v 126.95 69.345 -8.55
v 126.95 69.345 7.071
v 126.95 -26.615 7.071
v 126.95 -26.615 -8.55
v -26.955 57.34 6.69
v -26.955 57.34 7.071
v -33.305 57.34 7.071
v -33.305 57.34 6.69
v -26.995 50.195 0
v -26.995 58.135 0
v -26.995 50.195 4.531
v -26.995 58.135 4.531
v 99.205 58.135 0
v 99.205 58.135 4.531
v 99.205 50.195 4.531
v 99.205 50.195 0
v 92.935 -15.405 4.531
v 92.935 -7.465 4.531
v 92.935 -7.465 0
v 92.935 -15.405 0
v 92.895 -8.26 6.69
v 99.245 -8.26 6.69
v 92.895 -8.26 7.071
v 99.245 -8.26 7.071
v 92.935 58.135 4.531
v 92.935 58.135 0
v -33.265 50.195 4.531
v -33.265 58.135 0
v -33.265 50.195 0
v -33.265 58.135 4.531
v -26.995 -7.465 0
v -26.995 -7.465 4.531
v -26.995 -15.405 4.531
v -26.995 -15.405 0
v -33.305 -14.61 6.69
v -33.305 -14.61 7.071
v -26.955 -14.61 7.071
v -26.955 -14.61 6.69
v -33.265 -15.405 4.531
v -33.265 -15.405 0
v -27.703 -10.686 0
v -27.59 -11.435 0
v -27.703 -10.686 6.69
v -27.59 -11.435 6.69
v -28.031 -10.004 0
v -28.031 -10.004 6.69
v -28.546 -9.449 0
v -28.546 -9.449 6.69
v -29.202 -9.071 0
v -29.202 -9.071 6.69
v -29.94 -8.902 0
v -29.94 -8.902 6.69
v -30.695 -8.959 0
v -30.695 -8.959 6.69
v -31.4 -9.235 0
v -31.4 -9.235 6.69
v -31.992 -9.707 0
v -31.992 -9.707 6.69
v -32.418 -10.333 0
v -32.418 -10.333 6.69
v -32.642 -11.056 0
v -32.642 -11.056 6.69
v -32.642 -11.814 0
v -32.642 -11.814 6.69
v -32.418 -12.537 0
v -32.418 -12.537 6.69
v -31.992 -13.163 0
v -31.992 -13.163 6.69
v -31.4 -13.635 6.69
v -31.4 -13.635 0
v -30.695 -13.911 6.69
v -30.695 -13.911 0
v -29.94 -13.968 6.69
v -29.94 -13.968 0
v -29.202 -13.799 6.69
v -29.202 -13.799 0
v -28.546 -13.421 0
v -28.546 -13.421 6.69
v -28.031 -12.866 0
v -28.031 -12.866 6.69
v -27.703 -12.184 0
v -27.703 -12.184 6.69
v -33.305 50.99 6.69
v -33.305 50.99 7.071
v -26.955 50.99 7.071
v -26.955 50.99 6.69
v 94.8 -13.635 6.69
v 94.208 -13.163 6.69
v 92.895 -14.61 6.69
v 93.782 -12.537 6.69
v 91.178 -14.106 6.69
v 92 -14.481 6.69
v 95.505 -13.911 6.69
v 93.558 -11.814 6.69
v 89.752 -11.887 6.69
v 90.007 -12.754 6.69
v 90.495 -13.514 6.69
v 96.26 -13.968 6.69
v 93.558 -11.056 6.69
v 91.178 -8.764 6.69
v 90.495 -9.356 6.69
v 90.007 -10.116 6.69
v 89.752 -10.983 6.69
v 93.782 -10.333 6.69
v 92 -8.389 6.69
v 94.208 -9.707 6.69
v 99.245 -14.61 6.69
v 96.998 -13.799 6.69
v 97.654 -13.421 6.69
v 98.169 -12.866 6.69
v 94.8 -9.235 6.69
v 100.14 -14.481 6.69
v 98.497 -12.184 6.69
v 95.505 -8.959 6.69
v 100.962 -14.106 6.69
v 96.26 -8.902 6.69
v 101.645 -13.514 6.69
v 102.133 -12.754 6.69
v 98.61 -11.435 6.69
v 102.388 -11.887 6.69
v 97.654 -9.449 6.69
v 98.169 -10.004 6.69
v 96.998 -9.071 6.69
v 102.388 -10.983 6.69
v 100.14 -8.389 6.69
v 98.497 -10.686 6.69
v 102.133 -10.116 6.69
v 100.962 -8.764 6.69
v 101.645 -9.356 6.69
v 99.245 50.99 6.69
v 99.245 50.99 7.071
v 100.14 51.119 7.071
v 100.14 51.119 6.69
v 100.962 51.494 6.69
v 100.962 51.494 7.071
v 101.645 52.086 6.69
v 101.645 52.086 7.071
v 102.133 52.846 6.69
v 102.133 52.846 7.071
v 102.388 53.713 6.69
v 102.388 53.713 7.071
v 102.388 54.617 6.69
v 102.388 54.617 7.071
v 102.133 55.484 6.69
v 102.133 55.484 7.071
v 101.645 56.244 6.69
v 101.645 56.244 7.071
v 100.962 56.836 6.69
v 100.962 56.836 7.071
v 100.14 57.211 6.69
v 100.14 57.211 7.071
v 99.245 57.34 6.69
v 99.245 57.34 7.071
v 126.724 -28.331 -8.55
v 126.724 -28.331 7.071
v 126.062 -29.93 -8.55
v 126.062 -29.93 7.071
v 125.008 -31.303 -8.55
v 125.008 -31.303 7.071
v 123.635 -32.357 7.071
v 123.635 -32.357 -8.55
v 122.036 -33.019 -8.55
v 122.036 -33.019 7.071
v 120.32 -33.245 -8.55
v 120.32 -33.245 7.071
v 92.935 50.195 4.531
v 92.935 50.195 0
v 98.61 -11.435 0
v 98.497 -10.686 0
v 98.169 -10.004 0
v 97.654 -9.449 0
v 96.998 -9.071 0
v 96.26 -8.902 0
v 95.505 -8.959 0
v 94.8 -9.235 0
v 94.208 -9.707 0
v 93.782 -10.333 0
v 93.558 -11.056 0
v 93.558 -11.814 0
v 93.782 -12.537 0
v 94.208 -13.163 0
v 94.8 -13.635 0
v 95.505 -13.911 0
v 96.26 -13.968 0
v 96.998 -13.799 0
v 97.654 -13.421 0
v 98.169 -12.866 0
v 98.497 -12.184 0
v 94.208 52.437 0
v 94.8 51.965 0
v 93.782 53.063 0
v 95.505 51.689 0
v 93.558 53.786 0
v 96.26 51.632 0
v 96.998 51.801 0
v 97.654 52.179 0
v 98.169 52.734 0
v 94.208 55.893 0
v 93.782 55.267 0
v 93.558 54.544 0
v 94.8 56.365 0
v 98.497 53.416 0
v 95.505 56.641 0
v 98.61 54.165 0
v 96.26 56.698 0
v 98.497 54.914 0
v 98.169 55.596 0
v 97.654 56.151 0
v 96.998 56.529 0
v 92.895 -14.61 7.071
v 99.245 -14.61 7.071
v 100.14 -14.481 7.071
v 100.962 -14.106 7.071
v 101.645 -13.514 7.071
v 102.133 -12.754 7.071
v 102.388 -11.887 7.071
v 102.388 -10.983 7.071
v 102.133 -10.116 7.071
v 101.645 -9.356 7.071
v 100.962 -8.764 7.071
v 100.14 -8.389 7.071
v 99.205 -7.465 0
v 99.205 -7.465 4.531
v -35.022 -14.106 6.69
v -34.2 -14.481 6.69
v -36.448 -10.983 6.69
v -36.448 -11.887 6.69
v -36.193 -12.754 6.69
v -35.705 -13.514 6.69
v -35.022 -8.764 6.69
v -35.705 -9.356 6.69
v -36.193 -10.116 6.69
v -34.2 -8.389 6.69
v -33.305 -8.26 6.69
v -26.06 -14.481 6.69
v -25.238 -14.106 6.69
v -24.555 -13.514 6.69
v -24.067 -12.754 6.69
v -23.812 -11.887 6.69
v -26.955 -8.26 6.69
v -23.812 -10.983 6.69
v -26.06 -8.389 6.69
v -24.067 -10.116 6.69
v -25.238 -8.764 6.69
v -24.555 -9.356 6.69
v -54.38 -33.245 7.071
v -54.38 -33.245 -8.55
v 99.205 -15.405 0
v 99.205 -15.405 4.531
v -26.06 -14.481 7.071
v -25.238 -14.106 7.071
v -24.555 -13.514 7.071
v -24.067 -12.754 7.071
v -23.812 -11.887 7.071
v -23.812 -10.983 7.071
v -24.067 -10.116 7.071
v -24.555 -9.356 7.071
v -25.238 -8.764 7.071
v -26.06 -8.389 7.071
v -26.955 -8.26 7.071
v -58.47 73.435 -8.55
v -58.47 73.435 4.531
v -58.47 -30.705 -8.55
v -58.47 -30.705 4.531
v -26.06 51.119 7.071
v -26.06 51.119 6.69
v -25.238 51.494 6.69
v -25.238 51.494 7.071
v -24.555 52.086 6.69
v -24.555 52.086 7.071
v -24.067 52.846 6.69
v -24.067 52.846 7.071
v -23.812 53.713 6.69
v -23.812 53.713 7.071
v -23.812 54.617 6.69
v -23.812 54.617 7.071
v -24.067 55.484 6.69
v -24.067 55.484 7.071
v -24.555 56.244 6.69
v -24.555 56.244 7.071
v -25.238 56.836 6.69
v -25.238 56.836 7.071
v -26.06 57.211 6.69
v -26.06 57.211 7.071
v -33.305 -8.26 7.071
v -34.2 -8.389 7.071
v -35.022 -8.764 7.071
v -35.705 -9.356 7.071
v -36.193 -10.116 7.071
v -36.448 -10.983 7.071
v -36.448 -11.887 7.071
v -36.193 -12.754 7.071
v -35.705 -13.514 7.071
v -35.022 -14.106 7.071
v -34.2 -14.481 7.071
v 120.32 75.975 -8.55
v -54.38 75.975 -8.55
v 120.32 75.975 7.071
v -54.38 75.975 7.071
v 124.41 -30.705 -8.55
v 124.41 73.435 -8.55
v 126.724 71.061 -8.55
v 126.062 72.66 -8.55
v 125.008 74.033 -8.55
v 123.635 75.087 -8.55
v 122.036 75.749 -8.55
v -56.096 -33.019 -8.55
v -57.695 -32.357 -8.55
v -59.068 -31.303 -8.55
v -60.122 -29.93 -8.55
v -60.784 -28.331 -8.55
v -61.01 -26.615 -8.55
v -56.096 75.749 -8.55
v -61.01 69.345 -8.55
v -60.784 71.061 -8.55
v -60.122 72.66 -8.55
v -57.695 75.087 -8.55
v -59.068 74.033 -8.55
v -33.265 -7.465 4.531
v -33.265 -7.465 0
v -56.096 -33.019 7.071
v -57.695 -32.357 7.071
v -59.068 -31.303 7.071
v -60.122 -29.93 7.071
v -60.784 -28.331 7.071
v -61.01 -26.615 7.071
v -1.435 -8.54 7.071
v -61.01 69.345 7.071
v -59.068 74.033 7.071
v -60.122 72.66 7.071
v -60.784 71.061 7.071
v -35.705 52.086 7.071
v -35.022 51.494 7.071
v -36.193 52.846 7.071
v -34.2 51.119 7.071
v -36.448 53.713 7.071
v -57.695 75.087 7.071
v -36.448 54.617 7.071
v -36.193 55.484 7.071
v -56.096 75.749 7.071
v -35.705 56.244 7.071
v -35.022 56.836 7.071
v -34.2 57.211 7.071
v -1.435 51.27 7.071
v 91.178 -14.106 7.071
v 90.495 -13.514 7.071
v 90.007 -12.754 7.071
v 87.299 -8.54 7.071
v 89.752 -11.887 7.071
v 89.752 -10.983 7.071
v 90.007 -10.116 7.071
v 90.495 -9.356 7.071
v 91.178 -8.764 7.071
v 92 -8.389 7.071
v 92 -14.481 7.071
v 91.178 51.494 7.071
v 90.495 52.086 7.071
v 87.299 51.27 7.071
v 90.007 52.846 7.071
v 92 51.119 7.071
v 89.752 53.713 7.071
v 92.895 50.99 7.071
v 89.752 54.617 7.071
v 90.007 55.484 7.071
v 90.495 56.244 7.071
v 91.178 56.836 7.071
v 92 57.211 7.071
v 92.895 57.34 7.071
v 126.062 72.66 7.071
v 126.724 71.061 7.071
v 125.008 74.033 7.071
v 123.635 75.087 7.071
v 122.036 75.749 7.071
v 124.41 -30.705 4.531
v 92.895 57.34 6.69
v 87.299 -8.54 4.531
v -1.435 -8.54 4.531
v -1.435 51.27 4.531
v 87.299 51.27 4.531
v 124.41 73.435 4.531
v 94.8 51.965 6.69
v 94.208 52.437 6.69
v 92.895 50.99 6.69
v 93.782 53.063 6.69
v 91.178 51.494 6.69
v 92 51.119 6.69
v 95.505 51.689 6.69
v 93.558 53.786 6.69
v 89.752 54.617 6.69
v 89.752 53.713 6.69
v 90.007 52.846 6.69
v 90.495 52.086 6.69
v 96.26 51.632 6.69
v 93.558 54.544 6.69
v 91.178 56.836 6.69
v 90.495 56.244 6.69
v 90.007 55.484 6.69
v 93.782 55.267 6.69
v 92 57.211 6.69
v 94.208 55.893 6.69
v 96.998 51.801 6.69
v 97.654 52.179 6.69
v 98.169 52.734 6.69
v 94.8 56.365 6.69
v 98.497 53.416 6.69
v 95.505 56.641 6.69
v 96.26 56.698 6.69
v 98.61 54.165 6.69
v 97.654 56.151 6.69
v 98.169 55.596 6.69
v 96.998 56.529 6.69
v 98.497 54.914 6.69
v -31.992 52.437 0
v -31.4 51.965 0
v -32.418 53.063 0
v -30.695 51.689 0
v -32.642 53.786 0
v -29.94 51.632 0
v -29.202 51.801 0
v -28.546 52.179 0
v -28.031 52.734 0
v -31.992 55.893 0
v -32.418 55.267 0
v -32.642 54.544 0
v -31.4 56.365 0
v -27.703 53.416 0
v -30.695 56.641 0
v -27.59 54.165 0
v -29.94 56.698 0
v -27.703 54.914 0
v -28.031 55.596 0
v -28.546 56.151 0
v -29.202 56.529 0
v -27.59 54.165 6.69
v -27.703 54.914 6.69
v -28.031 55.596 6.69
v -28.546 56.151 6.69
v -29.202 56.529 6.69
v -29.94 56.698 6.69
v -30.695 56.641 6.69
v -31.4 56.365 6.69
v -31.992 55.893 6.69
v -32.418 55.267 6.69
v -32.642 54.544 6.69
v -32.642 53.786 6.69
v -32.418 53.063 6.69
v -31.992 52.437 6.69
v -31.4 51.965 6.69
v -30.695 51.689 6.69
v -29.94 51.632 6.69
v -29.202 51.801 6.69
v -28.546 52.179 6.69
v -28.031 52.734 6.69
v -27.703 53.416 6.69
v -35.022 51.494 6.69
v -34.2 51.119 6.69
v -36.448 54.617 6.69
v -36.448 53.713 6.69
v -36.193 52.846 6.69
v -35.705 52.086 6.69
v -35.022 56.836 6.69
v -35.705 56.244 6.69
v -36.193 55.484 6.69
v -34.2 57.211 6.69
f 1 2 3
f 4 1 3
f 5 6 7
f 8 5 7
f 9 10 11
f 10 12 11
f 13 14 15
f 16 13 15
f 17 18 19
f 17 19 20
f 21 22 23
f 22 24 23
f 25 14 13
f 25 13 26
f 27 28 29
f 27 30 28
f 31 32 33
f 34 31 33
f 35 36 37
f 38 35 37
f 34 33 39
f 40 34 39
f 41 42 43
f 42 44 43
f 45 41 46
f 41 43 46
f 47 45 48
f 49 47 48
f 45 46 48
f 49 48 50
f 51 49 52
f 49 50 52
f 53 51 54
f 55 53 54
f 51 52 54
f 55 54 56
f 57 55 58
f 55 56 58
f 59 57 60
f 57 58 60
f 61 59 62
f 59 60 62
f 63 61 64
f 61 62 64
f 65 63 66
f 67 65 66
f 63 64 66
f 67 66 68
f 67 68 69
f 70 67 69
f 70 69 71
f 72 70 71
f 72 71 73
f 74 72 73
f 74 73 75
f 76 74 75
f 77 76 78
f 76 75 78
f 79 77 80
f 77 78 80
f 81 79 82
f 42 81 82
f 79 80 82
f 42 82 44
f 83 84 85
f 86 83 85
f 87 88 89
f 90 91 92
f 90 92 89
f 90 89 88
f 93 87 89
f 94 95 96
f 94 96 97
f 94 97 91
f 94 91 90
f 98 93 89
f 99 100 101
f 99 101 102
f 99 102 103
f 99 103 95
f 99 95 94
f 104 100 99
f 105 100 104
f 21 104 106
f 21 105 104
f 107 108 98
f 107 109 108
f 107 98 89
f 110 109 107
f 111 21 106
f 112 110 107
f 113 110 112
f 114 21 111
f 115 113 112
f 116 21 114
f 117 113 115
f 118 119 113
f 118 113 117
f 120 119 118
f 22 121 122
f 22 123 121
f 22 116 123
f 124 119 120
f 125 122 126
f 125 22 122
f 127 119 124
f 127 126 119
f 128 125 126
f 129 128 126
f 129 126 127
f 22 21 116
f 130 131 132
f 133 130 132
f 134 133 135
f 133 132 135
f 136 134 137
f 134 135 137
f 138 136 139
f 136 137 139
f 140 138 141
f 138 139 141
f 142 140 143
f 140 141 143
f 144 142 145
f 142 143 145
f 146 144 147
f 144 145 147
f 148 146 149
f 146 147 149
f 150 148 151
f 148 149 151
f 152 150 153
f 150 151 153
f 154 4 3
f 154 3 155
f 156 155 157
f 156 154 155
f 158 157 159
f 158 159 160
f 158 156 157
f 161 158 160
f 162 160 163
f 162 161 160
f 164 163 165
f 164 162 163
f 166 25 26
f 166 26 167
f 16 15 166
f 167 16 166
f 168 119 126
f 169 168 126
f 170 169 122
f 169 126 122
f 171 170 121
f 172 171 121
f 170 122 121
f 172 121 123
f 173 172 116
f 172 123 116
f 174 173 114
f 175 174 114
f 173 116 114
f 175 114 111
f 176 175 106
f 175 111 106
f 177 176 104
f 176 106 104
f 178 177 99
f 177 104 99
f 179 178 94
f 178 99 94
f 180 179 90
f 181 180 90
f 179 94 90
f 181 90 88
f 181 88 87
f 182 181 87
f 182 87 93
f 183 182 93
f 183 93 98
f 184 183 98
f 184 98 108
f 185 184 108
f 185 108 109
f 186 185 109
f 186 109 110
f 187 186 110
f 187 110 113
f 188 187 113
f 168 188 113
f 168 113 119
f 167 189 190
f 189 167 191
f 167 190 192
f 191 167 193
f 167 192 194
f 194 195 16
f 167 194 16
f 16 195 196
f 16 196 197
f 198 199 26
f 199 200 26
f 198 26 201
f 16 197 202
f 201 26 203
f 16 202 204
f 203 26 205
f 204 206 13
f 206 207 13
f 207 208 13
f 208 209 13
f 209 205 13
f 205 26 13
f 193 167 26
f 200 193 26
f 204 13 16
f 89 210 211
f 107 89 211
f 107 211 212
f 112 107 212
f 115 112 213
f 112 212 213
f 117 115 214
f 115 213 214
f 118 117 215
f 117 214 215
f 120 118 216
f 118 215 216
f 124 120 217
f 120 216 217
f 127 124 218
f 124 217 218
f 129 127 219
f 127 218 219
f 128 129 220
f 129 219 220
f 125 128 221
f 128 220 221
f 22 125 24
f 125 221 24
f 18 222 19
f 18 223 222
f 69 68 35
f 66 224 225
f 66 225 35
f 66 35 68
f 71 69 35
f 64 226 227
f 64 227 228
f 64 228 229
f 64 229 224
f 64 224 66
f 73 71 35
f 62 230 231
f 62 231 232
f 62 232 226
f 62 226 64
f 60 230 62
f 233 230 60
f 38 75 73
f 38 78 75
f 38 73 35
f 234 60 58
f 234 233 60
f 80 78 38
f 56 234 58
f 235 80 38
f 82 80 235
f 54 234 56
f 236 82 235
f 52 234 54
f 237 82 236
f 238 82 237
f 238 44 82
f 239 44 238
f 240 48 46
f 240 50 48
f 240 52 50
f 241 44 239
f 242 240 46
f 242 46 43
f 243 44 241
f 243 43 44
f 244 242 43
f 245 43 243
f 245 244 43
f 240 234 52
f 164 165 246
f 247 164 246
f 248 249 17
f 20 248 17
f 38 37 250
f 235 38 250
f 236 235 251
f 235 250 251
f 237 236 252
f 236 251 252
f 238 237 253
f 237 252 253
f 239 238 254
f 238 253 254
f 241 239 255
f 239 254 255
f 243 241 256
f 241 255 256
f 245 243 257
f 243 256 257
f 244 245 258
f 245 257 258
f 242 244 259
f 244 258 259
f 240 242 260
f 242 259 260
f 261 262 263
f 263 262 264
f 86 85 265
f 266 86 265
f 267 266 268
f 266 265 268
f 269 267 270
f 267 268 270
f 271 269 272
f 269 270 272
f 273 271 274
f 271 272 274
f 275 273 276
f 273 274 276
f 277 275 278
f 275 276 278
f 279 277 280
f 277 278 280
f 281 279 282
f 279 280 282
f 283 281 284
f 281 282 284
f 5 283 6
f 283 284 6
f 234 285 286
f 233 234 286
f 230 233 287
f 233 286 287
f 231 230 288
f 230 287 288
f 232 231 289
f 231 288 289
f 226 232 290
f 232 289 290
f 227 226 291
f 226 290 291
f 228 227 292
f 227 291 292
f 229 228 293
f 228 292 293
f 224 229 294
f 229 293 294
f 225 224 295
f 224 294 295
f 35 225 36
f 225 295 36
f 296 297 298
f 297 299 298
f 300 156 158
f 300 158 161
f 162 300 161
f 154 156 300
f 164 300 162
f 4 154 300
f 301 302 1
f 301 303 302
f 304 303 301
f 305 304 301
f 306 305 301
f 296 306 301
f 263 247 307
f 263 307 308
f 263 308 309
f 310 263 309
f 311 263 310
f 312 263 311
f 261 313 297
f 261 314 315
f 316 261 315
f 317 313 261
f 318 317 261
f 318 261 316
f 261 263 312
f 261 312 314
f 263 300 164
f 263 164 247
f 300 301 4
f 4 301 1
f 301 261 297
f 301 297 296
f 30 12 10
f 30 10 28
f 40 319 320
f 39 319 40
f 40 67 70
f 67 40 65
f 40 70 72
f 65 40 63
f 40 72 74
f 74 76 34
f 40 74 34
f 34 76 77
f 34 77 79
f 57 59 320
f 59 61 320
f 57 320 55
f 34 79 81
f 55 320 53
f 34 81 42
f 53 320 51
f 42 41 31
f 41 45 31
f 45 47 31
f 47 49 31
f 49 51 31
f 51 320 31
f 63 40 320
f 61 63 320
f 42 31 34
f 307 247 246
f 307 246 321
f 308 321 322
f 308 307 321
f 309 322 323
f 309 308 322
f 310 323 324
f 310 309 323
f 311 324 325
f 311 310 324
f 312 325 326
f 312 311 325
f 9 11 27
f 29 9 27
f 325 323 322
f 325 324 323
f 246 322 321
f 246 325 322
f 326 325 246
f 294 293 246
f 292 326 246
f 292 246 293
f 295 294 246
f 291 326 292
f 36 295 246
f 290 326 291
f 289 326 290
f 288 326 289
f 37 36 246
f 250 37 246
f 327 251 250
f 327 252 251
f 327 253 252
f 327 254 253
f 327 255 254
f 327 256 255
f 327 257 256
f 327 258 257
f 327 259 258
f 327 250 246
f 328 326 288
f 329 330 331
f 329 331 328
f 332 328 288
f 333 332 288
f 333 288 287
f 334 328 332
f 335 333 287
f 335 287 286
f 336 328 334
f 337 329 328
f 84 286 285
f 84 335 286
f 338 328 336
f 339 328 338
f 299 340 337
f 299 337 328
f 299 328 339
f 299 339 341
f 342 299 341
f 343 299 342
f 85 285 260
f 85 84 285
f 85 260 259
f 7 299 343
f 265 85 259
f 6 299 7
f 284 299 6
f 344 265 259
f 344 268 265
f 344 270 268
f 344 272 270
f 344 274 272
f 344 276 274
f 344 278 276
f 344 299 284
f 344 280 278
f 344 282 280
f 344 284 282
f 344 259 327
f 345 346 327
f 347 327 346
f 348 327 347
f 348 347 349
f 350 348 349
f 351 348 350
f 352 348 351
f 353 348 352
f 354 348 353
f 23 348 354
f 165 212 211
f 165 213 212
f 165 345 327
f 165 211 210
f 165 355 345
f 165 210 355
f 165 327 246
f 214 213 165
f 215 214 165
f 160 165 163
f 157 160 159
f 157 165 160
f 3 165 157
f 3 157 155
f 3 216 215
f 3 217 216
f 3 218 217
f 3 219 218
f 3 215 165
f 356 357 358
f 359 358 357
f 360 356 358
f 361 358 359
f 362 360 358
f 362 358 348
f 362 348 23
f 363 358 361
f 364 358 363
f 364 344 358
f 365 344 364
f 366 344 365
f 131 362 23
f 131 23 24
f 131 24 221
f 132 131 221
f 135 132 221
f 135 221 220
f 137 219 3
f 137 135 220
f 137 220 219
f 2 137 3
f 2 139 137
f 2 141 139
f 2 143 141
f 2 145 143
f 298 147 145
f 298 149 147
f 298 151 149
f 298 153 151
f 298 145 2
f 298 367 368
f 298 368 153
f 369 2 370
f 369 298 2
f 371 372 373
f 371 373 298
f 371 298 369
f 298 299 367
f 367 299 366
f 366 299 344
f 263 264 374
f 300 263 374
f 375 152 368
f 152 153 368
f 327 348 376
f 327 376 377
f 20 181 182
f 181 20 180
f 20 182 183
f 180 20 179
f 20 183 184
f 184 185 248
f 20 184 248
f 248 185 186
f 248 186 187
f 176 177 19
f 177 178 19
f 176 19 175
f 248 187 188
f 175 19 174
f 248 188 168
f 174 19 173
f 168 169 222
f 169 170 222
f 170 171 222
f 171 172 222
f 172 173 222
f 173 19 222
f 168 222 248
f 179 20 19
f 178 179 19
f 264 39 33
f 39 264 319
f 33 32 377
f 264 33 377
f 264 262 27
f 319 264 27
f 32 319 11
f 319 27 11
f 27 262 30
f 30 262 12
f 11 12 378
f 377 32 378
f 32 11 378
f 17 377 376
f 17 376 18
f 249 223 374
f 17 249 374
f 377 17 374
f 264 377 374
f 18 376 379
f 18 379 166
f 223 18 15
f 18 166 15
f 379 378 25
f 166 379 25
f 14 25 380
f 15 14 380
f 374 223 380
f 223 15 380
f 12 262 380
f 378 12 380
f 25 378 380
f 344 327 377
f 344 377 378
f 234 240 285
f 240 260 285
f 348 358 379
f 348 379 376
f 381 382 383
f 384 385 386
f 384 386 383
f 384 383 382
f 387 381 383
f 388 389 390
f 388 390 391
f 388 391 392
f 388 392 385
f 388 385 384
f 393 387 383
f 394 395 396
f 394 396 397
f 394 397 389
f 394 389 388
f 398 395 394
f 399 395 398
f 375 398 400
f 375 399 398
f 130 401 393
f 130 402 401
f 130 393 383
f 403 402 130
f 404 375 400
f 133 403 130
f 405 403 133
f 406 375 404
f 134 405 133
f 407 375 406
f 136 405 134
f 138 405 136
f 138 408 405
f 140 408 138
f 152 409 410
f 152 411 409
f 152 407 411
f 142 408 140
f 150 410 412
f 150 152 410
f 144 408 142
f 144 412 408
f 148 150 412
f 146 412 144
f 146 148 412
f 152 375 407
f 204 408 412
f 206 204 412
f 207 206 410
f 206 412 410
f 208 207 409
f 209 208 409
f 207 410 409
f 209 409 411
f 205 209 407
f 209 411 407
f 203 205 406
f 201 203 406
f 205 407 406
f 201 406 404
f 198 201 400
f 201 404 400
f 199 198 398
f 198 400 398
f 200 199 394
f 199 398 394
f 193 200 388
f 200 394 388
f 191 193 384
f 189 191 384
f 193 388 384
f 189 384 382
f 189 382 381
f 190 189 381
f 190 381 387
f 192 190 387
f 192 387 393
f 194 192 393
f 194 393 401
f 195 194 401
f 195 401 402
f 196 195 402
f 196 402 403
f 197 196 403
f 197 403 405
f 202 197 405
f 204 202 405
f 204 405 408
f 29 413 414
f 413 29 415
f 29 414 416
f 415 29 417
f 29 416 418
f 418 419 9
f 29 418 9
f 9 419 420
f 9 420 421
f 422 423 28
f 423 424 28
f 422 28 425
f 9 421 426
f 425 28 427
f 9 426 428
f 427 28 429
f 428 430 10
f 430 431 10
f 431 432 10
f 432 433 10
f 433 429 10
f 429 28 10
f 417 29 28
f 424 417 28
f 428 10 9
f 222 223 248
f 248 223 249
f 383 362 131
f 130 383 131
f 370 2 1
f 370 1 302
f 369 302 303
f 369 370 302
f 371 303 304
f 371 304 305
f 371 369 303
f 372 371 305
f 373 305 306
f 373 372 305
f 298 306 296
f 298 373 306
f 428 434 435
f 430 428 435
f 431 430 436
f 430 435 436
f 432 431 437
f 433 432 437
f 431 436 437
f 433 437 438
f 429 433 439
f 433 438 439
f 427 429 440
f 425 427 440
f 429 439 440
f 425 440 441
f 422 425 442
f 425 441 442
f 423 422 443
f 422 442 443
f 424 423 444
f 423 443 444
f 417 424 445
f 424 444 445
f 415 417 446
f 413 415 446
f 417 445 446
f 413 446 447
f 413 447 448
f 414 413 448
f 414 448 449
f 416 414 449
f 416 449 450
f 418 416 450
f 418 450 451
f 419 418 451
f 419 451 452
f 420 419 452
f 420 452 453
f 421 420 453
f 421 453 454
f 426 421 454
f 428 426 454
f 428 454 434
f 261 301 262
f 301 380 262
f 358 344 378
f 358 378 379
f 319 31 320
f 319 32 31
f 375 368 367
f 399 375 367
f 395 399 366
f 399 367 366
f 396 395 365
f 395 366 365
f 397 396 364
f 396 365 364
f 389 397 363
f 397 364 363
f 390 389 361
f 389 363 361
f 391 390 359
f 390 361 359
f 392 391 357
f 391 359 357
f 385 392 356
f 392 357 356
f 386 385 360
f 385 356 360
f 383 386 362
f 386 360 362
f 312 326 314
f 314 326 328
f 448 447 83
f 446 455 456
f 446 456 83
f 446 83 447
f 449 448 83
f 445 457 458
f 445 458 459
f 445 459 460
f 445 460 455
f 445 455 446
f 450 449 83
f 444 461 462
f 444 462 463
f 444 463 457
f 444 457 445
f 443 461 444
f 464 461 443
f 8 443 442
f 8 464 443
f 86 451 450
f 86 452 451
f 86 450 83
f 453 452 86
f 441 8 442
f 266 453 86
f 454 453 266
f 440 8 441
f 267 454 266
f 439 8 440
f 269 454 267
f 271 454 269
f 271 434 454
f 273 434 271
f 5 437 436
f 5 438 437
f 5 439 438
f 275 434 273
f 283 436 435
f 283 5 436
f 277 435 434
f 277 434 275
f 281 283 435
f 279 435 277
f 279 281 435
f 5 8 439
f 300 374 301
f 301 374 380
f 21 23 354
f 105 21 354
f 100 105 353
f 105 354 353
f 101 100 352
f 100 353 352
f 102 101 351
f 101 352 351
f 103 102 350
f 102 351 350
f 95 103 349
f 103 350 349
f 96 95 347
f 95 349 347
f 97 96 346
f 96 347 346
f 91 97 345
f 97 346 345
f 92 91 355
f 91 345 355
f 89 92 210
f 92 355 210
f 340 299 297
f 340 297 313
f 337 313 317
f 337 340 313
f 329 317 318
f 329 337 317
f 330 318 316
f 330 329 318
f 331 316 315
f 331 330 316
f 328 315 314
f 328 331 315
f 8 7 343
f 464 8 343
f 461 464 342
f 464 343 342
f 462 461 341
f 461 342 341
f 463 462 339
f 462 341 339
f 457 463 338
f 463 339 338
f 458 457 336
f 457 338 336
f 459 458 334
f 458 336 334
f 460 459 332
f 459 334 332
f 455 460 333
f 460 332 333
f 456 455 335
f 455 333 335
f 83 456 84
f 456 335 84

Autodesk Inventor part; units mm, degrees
ref_plane "YZ Plane" through (0, 0, 0) normal (1, 0, 0) x (0, 1, 0)
ref_plane "Work Plane3" through (32.97, 21.365, 7.071) normal (0, 0, 1) x (1, 0, 0)
sketch "Sketch3" plane through (32.97, 21.365, 7.071) normal (0, 0, 1) x (1, 0, 0)
  line L0 (93.98, -54.61) -> (-93.98, -54.61)
  line L1 (-93.98, -54.61) -> (-93.98, 54.61)
  line L2 (-93.98, 54.61) -> (93.98, 54.61)
  line L3 (93.98, 54.61) -> (93.98, -54.61)
  line L4 (93.98, -54.61) -> (-93.98, 54.61) construction
  line L5 (-93.98, -54.61) -> (93.98, 54.61) construction
  line L6 (83.1, 48.8) -> (83.1, -50.3) projected
  line L7 (-81.6, 50.3) -> (81.6, 50.3) projected
  line L8 (-32.5, -25) -> (-32.5, 25) projected
  line L9 (52.4242, 25) -> (52.4242, -25) projected
  line L10 (49.4242, -28) -> (-29.5, -28) projected
  line L11 (-29.5, 28) -> (49.4242, 28) projected
  line L12 (-34.405, 29.905) -> (54.3292, 29.905)
  line L13 (54.3292, 29.905) -> (54.3292, -29.905)
  line L14 (54.3292, -29.905) -> (-34.405, -29.905)
  line L15 (-34.405, -29.905) -> (-34.405, 29.905)
  line L16 (49.4242, 28) -> (-29.5, 28) projected
  line L17 (-32.5, 25) -> (-32.5, -25) projected
  line L18 (49.4242, -28) -> (-29.5, -28) projected
  point P0 (-56.9284, 33.08)
  dimension "d6" = 187.96
  dimension "d7" = 109.22
  dimension "d8" = 4.31
  dimension "d9" = 10.88
  dimension "d55" = 1.905
  dimension "d56" = 1.905
  dimension "d57" = 1.905
  dimension "d58" = 1.905
extrude "Extrusion2" add sketch "Sketch3" against normal blind 2.54
sketch "Sketch5" plane through (32.97, 21.365, 7.071) normal (0, 0, 1) x (1, 0, 0)
  circle A0 centre (-63.1, 32.8) radius 1.5 projected
  circle A1 centre (-63.1, -32.8) radius 1.5 projected
  circle A2 centre (63.1, 32.8) radius 1.5 projected
  circle A3 centre (63.1, 32.8) radius 1.5 projected
  circle A4 centre (63.1, 32.8) radius 1.5 projected
  circle A5 centre (63.1, 32.8) radius 1.5 projected
  circle A6 centre (63.1, -32.8) radius 1.5 projected
  line L0 (-59.965, 36.77) -> (-59.965, 28.83) projected
  line L1 (-59.965, 36.77) -> (-66.235, 36.77) projected
  line L2 (-66.235, 36.77) -> (-66.235, 28.83) projected
  line L3 (-59.965, 28.83) -> (-66.235, 28.83) projected
  circle A7 centre (-63.1, 32.8) radius 1.5 projected
  line L4 (25.03, 27.635) -> (32.97, 27.635) projected
  line L5 (25.03, 27.635) -> (25.03, 21.365) projected
  line L6 (25.03, 21.365) -> (32.97, 21.365) projected
  line L7 (32.97, 27.635) -> (32.97, 21.365) projected
  circle A8 centre (29, 24.5) radius 1.25 projected
  line L8 (-59.965, -28.83) -> (-59.965, -36.77) projected
  line L9 (-59.965, -28.83) -> (-66.235, -28.83) projected
  line L10 (-66.235, -28.83) -> (-66.235, -36.77) projected
  line L11 (-59.965, -36.77) -> (-66.235, -36.77) projected
  circle A9 centre (-63.1, -32.8) radius 1.5 projected
  line L12 (66.235, -28.83) -> (66.235, -36.77) projected
  line L13 (66.235, -28.83) -> (59.965, -28.83) projected
  line L14 (59.965, -28.83) -> (59.965, -36.77) projected
  line L15 (66.235, -36.77) -> (59.965, -36.77) projected
  circle A10 centre (63.1, -32.8) radius 1.5 projected
  line L16 (66.235, 36.77) -> (66.235, 28.83) projected
  line L17 (66.235, 36.77) -> (59.965, 36.77) projected
  line L18 (59.965, 36.77) -> (59.965, 28.83) projected
  line L19 (66.235, 28.83) -> (59.965, 28.83) projected
  circle A11 centre (63.1, 32.8) radius 1.5 projected
  point P0 (-32.97, -21.365)
sketch "Sketch4" plane through (32.97, 21.365, 7.071) normal (0, 0, 1) x (1, 0, 0)
  circle A0 centre (-63.1, 32.8) radius 1.5 projected
  circle A1 centre (-63.1, -32.8) radius 1.5 projected
  circle A2 centre (63.1, -32.8) radius 1.5 projected
  circle A3 centre (63.1, 32.8) radius 1.5 projected
  circle A4 centre (-63.1, 32.8) radius 2.54
  circle A5 centre (63.1, 32.8) radius 2.54
  circle A6 centre (-63.1, -32.8) radius 2.54
  circle A7 centre (63.1, -32.8) radius 2.54
  point P0 (-32.97, -21.365)
  dimension "d12" = 5.08
ref_plane "Work Plane4" through (92.935, -15.405, 0) normal (0, 0, 1) x (1, 0, 0)
extrude "Extrusion3" add sketch "Sketch5" against normal up to surface (7.071 mm away) contours A2 | A6 | L0 L3 L2 L1 | L8 L11 L10 L9 | L12 L15 L14 L13 | L16 L19 L18 L17
extrude "Extrusion4" cut sketch "Sketch4" against normal up to surface (7.071 mm away) contours A0 | A1 | A2 | A3 | A4 | A5 | A6 | A7
ref_plane "Work Plane5" through (-62.51, -33.015, -8.55) normal (0, 0, 1) x (1, 0, 0)
sketch "Sketch7" plane through (32.97, 21.365, 4.531) normal (0, 0, -1) x (-1, 0, 0)
  line L0 (-91.44, 52.07) -> (91.44, 52.07)
  line L1 (91.44, 52.07) -> (91.44, -52.07)
  line L2 (91.44, -52.07) -> (-91.44, -52.07)
  line L3 (-91.44, -52.07) -> (-91.44, 52.07)
  line L4 (-91.44, 52.07) -> (91.44, -52.07) construction
  line L5 (91.44, 52.07) -> (-91.44, -52.07) construction
  line L6 (-93.98, -54.61) -> (93.98, -54.61) projected
  line L7 (93.98, -54.61) -> (93.98, 54.61) projected
  line L8 (-93.98, 54.61) -> (-93.98, -54.61) projected
  line L9 (93.98, 54.61) -> (-93.98, 54.61) projected
  point P0 (32.97, -21.365)
  point P1 (0, 0)
  dimension "d22" = 2.54
  dimension "d23" = 2.54
  dimension "d24" = 2.54
  dimension "d25" = 2.54
extrude "Extrusion5" add sketch "Sketch7" along normal up to surface (13.081 mm away)
fillet "Fillet1" radius 6.63 4 edges at (-61.01, 75.975, -0.7395) (126.95, 75.975, -0.7395) (126.95, -33.245, -0.7395) (-61.01, -33.245, -0.7395)
sketch "Sketch9" plane through (32.97, 21.365, 7.071) normal (0, 0, 1) x (1, 0, 0)
  circle A0 centre (-63.1, -32.8) radius 2.54 projected
  circle A1 centre (-63.1, 32.8) radius 2.54 projected
  circle A2 centre (63.1, 32.8) radius 2.54 projected
  line L0 (66.275, -32.8) -> (59.925, -32.8) construction
  circle A3 centre (63.1, -32.8) radius 2.54 projected
  line L1 (66.275, -29.625) -> (59.925, -29.625)
  line L2 (59.925, -35.975) -> (66.275, -35.975)
  arc A4 (66.275, -35.975) -> (66.275, -29.625) centre (66.275, -32.8) ccw
  arc A5 (59.925, -29.625) -> (59.925, -35.975) centre (59.925, -32.8) ccw
  line L3 (-59.925, -32.8) -> (-66.275, -32.8) construction
  line L4 (-59.925, -29.625) -> (-66.275, -29.625)
  line L5 (-66.275, -35.975) -> (-59.925, -35.975)
  arc A6 (-59.925, -35.975) -> (-59.925, -29.625) centre (-59.925, -32.8) ccw
  arc A7 (-66.275, -29.625) -> (-66.275, -35.975) centre (-66.275, -32.8) ccw
  line L6 (66.275, 32.8) -> (59.925, 32.8) construction
  line L7 (59.965, 36.77) -> (59.965, 28.83) projected
  line L8 (66.275, 35.975) -> (59.925, 35.975)
  line L9 (59.925, 29.625) -> (66.275, 29.625)
  arc A8 (66.275, 29.625) -> (66.275, 35.975) centre (66.275, 32.8) ccw
  arc A9 (59.925, 35.975) -> (59.925, 29.625) centre (59.925, 32.8) ccw
  line L10 (-59.925, 32.8) -> (-66.275, 32.8) construction
  line L11 (-59.925, 35.975) -> (-66.275, 35.975)
  line L12 (-66.275, 29.625) -> (-59.925, 29.625)
  arc A10 (-59.925, 29.625) -> (-59.925, 35.975) centre (-59.925, 32.8) ccw
  arc A11 (-66.275, 35.975) -> (-66.275, 29.625) centre (-66.275, 32.8) ccw
  point P0 (-32.97, -21.365)
  dimension "d47" = 3.175
  dimension "d48" = 6.35
extrude "Extrusion6" cut sketch "Sketch9" against normal blind 0.381 contours A0 | A1 | A2 | A3 | A4 L2 A5 L1 | A6 L5 A7 L4 | L8 A8 L9 L7 | L7 L9 A9 L8 | A10 L12 A11 L11
properties part number "RPi Desk Case"
